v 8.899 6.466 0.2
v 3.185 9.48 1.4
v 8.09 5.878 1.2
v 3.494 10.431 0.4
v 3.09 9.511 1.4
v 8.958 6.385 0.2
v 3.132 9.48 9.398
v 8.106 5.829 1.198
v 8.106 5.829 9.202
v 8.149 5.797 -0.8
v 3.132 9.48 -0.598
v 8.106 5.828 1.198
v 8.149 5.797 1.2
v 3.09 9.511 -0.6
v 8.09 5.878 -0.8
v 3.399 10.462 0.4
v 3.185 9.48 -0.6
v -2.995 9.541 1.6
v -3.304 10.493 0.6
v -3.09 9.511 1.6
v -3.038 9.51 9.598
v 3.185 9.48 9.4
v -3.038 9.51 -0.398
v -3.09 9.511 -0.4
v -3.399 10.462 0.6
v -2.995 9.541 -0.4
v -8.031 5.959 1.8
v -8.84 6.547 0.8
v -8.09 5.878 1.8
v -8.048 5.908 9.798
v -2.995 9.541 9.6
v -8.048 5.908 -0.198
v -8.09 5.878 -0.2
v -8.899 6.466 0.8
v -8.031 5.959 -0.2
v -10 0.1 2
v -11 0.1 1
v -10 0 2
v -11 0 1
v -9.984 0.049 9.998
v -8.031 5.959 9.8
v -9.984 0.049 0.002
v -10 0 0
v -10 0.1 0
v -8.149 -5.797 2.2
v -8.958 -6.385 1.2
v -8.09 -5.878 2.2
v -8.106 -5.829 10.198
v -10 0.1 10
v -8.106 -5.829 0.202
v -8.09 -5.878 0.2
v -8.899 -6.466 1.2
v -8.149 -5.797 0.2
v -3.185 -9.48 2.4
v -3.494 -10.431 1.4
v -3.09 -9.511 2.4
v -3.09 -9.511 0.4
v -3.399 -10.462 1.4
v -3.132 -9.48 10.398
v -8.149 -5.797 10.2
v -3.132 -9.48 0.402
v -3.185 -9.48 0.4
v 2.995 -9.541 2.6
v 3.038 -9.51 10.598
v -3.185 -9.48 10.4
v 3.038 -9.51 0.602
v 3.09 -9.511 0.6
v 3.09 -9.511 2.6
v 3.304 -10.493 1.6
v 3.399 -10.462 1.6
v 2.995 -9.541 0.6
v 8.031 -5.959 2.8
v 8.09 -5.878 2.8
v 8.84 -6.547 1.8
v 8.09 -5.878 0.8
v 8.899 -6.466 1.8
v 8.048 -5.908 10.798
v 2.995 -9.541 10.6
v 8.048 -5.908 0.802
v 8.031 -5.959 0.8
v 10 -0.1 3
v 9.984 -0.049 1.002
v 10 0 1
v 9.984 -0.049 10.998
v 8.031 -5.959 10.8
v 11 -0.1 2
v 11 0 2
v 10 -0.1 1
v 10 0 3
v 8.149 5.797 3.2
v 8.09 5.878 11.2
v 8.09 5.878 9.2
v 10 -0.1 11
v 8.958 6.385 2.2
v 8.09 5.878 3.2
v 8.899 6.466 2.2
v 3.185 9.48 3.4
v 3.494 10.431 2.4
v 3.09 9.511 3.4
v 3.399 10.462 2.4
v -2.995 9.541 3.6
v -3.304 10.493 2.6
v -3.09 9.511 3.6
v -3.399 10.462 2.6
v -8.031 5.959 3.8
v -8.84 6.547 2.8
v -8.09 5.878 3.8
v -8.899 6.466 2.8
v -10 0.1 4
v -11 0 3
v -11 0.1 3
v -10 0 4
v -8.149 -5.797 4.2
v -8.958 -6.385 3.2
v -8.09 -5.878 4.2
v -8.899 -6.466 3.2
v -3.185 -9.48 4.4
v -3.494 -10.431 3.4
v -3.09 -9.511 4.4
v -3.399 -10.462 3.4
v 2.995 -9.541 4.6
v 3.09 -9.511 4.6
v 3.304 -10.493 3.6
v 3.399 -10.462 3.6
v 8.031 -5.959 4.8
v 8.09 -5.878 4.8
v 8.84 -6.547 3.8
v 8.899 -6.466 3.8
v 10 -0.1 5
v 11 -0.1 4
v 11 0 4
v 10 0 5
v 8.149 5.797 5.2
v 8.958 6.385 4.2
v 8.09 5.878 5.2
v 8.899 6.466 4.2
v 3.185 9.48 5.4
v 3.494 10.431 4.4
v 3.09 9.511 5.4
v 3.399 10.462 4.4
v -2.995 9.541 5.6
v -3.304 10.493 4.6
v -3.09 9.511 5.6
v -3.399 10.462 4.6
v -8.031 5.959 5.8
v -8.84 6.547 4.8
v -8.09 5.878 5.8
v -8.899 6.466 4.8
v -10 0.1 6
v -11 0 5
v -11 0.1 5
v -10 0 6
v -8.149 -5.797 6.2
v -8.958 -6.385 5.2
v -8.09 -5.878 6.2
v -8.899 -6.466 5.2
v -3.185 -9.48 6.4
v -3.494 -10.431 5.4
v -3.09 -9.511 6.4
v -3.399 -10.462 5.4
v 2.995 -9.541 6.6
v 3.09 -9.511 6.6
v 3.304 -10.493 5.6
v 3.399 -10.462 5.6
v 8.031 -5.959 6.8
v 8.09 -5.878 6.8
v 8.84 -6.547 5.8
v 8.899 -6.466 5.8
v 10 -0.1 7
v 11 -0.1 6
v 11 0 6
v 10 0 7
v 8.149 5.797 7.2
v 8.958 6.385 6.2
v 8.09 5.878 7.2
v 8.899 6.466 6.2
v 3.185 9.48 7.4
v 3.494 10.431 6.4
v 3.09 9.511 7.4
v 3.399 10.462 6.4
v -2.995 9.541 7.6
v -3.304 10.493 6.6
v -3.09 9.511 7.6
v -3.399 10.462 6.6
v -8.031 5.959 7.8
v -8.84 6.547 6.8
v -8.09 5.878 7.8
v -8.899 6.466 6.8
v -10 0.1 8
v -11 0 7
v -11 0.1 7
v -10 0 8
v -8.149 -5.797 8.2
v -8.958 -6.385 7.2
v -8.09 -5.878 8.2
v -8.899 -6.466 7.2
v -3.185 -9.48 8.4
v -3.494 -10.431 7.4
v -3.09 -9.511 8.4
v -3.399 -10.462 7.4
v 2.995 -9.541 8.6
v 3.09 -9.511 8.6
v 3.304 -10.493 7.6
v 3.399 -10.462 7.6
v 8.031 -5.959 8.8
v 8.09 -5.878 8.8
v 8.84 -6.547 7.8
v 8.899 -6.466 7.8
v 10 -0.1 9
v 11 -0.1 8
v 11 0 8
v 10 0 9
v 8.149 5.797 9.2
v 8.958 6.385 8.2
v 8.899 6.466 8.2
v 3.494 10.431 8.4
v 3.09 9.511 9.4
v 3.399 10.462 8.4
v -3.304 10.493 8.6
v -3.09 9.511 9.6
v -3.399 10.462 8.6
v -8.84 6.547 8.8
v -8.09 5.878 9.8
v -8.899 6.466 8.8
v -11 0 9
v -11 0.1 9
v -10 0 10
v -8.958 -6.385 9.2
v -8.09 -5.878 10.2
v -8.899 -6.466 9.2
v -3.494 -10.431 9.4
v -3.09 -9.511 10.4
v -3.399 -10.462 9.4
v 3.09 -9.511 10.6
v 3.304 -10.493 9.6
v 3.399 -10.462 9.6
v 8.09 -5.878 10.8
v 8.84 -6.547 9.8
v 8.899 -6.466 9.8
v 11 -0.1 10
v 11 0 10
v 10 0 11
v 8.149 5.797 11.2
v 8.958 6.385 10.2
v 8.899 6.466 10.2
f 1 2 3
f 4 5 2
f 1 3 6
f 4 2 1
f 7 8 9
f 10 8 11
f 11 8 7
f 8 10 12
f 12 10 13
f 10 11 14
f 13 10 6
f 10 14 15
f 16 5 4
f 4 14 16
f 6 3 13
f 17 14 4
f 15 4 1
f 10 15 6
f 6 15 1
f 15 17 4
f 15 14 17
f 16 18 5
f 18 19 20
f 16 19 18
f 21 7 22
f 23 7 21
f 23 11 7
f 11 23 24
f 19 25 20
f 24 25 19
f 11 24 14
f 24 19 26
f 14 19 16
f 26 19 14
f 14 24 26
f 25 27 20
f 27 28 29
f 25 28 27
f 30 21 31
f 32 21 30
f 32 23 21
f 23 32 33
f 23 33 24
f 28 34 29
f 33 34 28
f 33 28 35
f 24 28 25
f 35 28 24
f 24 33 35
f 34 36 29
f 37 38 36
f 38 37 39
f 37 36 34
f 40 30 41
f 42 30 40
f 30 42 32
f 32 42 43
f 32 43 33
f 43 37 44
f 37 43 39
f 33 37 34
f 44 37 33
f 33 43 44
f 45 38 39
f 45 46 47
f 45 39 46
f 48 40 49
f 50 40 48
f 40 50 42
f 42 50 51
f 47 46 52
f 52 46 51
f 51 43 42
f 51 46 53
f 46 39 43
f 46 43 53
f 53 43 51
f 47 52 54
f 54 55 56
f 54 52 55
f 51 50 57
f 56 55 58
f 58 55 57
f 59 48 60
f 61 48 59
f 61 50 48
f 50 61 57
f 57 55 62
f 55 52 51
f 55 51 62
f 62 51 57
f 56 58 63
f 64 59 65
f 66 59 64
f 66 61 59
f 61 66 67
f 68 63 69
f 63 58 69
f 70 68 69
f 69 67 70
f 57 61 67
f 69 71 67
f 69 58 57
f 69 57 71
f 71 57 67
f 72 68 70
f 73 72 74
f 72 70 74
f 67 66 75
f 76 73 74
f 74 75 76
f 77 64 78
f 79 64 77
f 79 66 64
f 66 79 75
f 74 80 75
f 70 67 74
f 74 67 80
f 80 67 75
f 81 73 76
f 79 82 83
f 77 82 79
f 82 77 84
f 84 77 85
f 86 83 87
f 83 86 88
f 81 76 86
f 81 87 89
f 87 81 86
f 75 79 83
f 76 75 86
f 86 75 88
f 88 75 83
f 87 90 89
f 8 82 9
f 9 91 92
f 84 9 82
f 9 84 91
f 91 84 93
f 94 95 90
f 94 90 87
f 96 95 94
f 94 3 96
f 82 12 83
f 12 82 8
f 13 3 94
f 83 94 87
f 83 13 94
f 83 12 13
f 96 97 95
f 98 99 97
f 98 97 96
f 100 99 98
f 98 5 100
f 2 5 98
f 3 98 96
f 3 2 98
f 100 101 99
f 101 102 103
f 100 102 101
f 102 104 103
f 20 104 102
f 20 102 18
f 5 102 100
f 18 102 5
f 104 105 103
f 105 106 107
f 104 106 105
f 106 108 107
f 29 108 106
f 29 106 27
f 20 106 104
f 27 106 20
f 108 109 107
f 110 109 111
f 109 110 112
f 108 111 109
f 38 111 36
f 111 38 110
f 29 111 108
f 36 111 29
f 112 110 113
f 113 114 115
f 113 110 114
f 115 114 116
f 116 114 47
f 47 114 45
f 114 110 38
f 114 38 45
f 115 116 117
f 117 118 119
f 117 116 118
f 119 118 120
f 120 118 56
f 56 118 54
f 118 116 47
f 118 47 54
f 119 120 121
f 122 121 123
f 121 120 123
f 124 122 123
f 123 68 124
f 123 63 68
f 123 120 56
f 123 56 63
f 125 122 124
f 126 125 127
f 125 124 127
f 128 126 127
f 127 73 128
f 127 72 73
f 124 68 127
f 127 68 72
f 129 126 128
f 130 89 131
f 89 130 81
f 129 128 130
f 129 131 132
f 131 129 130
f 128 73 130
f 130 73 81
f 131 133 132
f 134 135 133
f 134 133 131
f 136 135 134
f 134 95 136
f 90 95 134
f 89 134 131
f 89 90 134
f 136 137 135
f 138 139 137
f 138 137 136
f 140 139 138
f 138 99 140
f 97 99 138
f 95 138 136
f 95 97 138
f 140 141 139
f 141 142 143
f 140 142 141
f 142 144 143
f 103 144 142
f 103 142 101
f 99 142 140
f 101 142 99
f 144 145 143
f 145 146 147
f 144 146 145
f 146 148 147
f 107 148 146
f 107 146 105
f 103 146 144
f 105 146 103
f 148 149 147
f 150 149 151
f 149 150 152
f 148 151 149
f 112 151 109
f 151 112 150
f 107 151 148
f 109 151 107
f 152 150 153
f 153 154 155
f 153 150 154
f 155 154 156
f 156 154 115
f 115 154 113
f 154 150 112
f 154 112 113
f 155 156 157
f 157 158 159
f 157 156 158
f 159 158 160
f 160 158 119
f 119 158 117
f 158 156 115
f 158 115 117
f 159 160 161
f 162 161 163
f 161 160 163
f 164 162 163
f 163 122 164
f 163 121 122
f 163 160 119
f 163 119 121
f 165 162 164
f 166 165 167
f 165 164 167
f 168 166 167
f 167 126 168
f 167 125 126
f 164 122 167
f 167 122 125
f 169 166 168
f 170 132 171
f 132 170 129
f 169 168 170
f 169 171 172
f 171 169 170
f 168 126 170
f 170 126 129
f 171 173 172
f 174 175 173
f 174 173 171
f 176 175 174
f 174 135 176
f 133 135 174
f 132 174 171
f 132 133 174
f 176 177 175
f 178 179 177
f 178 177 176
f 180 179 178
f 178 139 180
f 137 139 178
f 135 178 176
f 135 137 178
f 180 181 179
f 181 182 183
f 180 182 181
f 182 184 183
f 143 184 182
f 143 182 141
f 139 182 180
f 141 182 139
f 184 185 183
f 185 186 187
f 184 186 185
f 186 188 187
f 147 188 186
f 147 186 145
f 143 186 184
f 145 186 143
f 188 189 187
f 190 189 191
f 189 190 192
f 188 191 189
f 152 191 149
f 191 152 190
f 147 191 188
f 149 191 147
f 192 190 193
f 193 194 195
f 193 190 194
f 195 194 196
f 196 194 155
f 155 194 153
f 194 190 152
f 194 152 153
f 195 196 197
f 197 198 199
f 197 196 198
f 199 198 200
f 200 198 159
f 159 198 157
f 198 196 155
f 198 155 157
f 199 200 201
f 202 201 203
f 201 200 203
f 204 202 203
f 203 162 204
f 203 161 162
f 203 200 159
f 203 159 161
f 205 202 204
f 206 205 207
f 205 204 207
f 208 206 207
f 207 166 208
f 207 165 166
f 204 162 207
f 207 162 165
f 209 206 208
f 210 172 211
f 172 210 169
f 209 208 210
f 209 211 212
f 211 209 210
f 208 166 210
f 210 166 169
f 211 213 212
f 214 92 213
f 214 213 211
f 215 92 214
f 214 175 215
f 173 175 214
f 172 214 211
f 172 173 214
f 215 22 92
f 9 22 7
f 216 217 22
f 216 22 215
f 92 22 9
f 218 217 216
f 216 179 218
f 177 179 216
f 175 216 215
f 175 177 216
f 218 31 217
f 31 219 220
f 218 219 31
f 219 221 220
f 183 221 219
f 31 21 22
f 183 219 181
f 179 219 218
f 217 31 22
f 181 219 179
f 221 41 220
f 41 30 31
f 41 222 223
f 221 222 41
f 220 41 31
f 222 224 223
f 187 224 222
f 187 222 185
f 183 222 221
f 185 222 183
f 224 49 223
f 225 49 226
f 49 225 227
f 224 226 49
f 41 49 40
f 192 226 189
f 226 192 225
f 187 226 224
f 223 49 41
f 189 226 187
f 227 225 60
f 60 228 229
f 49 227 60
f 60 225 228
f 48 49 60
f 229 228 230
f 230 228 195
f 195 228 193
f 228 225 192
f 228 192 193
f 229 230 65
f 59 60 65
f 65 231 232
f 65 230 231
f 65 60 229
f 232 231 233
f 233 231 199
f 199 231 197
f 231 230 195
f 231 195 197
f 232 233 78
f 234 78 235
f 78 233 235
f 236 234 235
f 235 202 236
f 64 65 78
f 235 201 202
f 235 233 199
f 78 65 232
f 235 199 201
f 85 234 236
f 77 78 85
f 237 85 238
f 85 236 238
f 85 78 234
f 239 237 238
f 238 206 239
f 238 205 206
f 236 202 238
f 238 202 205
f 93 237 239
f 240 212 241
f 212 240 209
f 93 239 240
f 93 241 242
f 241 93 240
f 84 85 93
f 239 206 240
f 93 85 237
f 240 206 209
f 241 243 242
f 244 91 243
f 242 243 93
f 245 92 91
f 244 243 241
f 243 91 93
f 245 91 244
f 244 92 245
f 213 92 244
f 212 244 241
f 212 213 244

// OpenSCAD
//we're going to make a screw
 
//example values:
resolution = 50;
turns = 5;
height = 10;
deltathread = height / turns / 2;
trivial = 0.1;
innerdiameter = 10;
outerdiameter = 11;

for(i=[1:resolution]) {
  rotate(a=[0,0,(turns * 360 * i)/resolution])    //a little bit of turn, depending on the resolution
    translate([0,0,i * height/resolution])        //move up the appropriate amount.
      hull(){                                     
          //each unit is going to be a skew triangular prism.
          //this will be defined by taking two really thin triangle prisms (linearly extruded polygons) and
          //constructing the convex hull between the two.
          //note that linear extrusion operates in the Z direction, so the triangles will have to be rotated first.
          
        //first triangle, this one is simple.
        rotate([90,0,0])
          linear_extrude(height=trivial)
            polygon([[innerdiameter,deltathread],[innerdiameter,-deltathread],[outerdiameter,0]]);
 
        //second triangle.
        translate([0,0,height/resolution])       //lift it by the appropriate amount.
        rotate([0,0,turns * 360/resolution])     //rotate it by a single resolution unit; to match with next segment.
        rotate([90,0,0])
          linear_extrude(height=trivial)
              polygon([[innerdiameter,deltathread],[innerdiameter,-deltathread],[outerdiameter,0]]);
      }
}
